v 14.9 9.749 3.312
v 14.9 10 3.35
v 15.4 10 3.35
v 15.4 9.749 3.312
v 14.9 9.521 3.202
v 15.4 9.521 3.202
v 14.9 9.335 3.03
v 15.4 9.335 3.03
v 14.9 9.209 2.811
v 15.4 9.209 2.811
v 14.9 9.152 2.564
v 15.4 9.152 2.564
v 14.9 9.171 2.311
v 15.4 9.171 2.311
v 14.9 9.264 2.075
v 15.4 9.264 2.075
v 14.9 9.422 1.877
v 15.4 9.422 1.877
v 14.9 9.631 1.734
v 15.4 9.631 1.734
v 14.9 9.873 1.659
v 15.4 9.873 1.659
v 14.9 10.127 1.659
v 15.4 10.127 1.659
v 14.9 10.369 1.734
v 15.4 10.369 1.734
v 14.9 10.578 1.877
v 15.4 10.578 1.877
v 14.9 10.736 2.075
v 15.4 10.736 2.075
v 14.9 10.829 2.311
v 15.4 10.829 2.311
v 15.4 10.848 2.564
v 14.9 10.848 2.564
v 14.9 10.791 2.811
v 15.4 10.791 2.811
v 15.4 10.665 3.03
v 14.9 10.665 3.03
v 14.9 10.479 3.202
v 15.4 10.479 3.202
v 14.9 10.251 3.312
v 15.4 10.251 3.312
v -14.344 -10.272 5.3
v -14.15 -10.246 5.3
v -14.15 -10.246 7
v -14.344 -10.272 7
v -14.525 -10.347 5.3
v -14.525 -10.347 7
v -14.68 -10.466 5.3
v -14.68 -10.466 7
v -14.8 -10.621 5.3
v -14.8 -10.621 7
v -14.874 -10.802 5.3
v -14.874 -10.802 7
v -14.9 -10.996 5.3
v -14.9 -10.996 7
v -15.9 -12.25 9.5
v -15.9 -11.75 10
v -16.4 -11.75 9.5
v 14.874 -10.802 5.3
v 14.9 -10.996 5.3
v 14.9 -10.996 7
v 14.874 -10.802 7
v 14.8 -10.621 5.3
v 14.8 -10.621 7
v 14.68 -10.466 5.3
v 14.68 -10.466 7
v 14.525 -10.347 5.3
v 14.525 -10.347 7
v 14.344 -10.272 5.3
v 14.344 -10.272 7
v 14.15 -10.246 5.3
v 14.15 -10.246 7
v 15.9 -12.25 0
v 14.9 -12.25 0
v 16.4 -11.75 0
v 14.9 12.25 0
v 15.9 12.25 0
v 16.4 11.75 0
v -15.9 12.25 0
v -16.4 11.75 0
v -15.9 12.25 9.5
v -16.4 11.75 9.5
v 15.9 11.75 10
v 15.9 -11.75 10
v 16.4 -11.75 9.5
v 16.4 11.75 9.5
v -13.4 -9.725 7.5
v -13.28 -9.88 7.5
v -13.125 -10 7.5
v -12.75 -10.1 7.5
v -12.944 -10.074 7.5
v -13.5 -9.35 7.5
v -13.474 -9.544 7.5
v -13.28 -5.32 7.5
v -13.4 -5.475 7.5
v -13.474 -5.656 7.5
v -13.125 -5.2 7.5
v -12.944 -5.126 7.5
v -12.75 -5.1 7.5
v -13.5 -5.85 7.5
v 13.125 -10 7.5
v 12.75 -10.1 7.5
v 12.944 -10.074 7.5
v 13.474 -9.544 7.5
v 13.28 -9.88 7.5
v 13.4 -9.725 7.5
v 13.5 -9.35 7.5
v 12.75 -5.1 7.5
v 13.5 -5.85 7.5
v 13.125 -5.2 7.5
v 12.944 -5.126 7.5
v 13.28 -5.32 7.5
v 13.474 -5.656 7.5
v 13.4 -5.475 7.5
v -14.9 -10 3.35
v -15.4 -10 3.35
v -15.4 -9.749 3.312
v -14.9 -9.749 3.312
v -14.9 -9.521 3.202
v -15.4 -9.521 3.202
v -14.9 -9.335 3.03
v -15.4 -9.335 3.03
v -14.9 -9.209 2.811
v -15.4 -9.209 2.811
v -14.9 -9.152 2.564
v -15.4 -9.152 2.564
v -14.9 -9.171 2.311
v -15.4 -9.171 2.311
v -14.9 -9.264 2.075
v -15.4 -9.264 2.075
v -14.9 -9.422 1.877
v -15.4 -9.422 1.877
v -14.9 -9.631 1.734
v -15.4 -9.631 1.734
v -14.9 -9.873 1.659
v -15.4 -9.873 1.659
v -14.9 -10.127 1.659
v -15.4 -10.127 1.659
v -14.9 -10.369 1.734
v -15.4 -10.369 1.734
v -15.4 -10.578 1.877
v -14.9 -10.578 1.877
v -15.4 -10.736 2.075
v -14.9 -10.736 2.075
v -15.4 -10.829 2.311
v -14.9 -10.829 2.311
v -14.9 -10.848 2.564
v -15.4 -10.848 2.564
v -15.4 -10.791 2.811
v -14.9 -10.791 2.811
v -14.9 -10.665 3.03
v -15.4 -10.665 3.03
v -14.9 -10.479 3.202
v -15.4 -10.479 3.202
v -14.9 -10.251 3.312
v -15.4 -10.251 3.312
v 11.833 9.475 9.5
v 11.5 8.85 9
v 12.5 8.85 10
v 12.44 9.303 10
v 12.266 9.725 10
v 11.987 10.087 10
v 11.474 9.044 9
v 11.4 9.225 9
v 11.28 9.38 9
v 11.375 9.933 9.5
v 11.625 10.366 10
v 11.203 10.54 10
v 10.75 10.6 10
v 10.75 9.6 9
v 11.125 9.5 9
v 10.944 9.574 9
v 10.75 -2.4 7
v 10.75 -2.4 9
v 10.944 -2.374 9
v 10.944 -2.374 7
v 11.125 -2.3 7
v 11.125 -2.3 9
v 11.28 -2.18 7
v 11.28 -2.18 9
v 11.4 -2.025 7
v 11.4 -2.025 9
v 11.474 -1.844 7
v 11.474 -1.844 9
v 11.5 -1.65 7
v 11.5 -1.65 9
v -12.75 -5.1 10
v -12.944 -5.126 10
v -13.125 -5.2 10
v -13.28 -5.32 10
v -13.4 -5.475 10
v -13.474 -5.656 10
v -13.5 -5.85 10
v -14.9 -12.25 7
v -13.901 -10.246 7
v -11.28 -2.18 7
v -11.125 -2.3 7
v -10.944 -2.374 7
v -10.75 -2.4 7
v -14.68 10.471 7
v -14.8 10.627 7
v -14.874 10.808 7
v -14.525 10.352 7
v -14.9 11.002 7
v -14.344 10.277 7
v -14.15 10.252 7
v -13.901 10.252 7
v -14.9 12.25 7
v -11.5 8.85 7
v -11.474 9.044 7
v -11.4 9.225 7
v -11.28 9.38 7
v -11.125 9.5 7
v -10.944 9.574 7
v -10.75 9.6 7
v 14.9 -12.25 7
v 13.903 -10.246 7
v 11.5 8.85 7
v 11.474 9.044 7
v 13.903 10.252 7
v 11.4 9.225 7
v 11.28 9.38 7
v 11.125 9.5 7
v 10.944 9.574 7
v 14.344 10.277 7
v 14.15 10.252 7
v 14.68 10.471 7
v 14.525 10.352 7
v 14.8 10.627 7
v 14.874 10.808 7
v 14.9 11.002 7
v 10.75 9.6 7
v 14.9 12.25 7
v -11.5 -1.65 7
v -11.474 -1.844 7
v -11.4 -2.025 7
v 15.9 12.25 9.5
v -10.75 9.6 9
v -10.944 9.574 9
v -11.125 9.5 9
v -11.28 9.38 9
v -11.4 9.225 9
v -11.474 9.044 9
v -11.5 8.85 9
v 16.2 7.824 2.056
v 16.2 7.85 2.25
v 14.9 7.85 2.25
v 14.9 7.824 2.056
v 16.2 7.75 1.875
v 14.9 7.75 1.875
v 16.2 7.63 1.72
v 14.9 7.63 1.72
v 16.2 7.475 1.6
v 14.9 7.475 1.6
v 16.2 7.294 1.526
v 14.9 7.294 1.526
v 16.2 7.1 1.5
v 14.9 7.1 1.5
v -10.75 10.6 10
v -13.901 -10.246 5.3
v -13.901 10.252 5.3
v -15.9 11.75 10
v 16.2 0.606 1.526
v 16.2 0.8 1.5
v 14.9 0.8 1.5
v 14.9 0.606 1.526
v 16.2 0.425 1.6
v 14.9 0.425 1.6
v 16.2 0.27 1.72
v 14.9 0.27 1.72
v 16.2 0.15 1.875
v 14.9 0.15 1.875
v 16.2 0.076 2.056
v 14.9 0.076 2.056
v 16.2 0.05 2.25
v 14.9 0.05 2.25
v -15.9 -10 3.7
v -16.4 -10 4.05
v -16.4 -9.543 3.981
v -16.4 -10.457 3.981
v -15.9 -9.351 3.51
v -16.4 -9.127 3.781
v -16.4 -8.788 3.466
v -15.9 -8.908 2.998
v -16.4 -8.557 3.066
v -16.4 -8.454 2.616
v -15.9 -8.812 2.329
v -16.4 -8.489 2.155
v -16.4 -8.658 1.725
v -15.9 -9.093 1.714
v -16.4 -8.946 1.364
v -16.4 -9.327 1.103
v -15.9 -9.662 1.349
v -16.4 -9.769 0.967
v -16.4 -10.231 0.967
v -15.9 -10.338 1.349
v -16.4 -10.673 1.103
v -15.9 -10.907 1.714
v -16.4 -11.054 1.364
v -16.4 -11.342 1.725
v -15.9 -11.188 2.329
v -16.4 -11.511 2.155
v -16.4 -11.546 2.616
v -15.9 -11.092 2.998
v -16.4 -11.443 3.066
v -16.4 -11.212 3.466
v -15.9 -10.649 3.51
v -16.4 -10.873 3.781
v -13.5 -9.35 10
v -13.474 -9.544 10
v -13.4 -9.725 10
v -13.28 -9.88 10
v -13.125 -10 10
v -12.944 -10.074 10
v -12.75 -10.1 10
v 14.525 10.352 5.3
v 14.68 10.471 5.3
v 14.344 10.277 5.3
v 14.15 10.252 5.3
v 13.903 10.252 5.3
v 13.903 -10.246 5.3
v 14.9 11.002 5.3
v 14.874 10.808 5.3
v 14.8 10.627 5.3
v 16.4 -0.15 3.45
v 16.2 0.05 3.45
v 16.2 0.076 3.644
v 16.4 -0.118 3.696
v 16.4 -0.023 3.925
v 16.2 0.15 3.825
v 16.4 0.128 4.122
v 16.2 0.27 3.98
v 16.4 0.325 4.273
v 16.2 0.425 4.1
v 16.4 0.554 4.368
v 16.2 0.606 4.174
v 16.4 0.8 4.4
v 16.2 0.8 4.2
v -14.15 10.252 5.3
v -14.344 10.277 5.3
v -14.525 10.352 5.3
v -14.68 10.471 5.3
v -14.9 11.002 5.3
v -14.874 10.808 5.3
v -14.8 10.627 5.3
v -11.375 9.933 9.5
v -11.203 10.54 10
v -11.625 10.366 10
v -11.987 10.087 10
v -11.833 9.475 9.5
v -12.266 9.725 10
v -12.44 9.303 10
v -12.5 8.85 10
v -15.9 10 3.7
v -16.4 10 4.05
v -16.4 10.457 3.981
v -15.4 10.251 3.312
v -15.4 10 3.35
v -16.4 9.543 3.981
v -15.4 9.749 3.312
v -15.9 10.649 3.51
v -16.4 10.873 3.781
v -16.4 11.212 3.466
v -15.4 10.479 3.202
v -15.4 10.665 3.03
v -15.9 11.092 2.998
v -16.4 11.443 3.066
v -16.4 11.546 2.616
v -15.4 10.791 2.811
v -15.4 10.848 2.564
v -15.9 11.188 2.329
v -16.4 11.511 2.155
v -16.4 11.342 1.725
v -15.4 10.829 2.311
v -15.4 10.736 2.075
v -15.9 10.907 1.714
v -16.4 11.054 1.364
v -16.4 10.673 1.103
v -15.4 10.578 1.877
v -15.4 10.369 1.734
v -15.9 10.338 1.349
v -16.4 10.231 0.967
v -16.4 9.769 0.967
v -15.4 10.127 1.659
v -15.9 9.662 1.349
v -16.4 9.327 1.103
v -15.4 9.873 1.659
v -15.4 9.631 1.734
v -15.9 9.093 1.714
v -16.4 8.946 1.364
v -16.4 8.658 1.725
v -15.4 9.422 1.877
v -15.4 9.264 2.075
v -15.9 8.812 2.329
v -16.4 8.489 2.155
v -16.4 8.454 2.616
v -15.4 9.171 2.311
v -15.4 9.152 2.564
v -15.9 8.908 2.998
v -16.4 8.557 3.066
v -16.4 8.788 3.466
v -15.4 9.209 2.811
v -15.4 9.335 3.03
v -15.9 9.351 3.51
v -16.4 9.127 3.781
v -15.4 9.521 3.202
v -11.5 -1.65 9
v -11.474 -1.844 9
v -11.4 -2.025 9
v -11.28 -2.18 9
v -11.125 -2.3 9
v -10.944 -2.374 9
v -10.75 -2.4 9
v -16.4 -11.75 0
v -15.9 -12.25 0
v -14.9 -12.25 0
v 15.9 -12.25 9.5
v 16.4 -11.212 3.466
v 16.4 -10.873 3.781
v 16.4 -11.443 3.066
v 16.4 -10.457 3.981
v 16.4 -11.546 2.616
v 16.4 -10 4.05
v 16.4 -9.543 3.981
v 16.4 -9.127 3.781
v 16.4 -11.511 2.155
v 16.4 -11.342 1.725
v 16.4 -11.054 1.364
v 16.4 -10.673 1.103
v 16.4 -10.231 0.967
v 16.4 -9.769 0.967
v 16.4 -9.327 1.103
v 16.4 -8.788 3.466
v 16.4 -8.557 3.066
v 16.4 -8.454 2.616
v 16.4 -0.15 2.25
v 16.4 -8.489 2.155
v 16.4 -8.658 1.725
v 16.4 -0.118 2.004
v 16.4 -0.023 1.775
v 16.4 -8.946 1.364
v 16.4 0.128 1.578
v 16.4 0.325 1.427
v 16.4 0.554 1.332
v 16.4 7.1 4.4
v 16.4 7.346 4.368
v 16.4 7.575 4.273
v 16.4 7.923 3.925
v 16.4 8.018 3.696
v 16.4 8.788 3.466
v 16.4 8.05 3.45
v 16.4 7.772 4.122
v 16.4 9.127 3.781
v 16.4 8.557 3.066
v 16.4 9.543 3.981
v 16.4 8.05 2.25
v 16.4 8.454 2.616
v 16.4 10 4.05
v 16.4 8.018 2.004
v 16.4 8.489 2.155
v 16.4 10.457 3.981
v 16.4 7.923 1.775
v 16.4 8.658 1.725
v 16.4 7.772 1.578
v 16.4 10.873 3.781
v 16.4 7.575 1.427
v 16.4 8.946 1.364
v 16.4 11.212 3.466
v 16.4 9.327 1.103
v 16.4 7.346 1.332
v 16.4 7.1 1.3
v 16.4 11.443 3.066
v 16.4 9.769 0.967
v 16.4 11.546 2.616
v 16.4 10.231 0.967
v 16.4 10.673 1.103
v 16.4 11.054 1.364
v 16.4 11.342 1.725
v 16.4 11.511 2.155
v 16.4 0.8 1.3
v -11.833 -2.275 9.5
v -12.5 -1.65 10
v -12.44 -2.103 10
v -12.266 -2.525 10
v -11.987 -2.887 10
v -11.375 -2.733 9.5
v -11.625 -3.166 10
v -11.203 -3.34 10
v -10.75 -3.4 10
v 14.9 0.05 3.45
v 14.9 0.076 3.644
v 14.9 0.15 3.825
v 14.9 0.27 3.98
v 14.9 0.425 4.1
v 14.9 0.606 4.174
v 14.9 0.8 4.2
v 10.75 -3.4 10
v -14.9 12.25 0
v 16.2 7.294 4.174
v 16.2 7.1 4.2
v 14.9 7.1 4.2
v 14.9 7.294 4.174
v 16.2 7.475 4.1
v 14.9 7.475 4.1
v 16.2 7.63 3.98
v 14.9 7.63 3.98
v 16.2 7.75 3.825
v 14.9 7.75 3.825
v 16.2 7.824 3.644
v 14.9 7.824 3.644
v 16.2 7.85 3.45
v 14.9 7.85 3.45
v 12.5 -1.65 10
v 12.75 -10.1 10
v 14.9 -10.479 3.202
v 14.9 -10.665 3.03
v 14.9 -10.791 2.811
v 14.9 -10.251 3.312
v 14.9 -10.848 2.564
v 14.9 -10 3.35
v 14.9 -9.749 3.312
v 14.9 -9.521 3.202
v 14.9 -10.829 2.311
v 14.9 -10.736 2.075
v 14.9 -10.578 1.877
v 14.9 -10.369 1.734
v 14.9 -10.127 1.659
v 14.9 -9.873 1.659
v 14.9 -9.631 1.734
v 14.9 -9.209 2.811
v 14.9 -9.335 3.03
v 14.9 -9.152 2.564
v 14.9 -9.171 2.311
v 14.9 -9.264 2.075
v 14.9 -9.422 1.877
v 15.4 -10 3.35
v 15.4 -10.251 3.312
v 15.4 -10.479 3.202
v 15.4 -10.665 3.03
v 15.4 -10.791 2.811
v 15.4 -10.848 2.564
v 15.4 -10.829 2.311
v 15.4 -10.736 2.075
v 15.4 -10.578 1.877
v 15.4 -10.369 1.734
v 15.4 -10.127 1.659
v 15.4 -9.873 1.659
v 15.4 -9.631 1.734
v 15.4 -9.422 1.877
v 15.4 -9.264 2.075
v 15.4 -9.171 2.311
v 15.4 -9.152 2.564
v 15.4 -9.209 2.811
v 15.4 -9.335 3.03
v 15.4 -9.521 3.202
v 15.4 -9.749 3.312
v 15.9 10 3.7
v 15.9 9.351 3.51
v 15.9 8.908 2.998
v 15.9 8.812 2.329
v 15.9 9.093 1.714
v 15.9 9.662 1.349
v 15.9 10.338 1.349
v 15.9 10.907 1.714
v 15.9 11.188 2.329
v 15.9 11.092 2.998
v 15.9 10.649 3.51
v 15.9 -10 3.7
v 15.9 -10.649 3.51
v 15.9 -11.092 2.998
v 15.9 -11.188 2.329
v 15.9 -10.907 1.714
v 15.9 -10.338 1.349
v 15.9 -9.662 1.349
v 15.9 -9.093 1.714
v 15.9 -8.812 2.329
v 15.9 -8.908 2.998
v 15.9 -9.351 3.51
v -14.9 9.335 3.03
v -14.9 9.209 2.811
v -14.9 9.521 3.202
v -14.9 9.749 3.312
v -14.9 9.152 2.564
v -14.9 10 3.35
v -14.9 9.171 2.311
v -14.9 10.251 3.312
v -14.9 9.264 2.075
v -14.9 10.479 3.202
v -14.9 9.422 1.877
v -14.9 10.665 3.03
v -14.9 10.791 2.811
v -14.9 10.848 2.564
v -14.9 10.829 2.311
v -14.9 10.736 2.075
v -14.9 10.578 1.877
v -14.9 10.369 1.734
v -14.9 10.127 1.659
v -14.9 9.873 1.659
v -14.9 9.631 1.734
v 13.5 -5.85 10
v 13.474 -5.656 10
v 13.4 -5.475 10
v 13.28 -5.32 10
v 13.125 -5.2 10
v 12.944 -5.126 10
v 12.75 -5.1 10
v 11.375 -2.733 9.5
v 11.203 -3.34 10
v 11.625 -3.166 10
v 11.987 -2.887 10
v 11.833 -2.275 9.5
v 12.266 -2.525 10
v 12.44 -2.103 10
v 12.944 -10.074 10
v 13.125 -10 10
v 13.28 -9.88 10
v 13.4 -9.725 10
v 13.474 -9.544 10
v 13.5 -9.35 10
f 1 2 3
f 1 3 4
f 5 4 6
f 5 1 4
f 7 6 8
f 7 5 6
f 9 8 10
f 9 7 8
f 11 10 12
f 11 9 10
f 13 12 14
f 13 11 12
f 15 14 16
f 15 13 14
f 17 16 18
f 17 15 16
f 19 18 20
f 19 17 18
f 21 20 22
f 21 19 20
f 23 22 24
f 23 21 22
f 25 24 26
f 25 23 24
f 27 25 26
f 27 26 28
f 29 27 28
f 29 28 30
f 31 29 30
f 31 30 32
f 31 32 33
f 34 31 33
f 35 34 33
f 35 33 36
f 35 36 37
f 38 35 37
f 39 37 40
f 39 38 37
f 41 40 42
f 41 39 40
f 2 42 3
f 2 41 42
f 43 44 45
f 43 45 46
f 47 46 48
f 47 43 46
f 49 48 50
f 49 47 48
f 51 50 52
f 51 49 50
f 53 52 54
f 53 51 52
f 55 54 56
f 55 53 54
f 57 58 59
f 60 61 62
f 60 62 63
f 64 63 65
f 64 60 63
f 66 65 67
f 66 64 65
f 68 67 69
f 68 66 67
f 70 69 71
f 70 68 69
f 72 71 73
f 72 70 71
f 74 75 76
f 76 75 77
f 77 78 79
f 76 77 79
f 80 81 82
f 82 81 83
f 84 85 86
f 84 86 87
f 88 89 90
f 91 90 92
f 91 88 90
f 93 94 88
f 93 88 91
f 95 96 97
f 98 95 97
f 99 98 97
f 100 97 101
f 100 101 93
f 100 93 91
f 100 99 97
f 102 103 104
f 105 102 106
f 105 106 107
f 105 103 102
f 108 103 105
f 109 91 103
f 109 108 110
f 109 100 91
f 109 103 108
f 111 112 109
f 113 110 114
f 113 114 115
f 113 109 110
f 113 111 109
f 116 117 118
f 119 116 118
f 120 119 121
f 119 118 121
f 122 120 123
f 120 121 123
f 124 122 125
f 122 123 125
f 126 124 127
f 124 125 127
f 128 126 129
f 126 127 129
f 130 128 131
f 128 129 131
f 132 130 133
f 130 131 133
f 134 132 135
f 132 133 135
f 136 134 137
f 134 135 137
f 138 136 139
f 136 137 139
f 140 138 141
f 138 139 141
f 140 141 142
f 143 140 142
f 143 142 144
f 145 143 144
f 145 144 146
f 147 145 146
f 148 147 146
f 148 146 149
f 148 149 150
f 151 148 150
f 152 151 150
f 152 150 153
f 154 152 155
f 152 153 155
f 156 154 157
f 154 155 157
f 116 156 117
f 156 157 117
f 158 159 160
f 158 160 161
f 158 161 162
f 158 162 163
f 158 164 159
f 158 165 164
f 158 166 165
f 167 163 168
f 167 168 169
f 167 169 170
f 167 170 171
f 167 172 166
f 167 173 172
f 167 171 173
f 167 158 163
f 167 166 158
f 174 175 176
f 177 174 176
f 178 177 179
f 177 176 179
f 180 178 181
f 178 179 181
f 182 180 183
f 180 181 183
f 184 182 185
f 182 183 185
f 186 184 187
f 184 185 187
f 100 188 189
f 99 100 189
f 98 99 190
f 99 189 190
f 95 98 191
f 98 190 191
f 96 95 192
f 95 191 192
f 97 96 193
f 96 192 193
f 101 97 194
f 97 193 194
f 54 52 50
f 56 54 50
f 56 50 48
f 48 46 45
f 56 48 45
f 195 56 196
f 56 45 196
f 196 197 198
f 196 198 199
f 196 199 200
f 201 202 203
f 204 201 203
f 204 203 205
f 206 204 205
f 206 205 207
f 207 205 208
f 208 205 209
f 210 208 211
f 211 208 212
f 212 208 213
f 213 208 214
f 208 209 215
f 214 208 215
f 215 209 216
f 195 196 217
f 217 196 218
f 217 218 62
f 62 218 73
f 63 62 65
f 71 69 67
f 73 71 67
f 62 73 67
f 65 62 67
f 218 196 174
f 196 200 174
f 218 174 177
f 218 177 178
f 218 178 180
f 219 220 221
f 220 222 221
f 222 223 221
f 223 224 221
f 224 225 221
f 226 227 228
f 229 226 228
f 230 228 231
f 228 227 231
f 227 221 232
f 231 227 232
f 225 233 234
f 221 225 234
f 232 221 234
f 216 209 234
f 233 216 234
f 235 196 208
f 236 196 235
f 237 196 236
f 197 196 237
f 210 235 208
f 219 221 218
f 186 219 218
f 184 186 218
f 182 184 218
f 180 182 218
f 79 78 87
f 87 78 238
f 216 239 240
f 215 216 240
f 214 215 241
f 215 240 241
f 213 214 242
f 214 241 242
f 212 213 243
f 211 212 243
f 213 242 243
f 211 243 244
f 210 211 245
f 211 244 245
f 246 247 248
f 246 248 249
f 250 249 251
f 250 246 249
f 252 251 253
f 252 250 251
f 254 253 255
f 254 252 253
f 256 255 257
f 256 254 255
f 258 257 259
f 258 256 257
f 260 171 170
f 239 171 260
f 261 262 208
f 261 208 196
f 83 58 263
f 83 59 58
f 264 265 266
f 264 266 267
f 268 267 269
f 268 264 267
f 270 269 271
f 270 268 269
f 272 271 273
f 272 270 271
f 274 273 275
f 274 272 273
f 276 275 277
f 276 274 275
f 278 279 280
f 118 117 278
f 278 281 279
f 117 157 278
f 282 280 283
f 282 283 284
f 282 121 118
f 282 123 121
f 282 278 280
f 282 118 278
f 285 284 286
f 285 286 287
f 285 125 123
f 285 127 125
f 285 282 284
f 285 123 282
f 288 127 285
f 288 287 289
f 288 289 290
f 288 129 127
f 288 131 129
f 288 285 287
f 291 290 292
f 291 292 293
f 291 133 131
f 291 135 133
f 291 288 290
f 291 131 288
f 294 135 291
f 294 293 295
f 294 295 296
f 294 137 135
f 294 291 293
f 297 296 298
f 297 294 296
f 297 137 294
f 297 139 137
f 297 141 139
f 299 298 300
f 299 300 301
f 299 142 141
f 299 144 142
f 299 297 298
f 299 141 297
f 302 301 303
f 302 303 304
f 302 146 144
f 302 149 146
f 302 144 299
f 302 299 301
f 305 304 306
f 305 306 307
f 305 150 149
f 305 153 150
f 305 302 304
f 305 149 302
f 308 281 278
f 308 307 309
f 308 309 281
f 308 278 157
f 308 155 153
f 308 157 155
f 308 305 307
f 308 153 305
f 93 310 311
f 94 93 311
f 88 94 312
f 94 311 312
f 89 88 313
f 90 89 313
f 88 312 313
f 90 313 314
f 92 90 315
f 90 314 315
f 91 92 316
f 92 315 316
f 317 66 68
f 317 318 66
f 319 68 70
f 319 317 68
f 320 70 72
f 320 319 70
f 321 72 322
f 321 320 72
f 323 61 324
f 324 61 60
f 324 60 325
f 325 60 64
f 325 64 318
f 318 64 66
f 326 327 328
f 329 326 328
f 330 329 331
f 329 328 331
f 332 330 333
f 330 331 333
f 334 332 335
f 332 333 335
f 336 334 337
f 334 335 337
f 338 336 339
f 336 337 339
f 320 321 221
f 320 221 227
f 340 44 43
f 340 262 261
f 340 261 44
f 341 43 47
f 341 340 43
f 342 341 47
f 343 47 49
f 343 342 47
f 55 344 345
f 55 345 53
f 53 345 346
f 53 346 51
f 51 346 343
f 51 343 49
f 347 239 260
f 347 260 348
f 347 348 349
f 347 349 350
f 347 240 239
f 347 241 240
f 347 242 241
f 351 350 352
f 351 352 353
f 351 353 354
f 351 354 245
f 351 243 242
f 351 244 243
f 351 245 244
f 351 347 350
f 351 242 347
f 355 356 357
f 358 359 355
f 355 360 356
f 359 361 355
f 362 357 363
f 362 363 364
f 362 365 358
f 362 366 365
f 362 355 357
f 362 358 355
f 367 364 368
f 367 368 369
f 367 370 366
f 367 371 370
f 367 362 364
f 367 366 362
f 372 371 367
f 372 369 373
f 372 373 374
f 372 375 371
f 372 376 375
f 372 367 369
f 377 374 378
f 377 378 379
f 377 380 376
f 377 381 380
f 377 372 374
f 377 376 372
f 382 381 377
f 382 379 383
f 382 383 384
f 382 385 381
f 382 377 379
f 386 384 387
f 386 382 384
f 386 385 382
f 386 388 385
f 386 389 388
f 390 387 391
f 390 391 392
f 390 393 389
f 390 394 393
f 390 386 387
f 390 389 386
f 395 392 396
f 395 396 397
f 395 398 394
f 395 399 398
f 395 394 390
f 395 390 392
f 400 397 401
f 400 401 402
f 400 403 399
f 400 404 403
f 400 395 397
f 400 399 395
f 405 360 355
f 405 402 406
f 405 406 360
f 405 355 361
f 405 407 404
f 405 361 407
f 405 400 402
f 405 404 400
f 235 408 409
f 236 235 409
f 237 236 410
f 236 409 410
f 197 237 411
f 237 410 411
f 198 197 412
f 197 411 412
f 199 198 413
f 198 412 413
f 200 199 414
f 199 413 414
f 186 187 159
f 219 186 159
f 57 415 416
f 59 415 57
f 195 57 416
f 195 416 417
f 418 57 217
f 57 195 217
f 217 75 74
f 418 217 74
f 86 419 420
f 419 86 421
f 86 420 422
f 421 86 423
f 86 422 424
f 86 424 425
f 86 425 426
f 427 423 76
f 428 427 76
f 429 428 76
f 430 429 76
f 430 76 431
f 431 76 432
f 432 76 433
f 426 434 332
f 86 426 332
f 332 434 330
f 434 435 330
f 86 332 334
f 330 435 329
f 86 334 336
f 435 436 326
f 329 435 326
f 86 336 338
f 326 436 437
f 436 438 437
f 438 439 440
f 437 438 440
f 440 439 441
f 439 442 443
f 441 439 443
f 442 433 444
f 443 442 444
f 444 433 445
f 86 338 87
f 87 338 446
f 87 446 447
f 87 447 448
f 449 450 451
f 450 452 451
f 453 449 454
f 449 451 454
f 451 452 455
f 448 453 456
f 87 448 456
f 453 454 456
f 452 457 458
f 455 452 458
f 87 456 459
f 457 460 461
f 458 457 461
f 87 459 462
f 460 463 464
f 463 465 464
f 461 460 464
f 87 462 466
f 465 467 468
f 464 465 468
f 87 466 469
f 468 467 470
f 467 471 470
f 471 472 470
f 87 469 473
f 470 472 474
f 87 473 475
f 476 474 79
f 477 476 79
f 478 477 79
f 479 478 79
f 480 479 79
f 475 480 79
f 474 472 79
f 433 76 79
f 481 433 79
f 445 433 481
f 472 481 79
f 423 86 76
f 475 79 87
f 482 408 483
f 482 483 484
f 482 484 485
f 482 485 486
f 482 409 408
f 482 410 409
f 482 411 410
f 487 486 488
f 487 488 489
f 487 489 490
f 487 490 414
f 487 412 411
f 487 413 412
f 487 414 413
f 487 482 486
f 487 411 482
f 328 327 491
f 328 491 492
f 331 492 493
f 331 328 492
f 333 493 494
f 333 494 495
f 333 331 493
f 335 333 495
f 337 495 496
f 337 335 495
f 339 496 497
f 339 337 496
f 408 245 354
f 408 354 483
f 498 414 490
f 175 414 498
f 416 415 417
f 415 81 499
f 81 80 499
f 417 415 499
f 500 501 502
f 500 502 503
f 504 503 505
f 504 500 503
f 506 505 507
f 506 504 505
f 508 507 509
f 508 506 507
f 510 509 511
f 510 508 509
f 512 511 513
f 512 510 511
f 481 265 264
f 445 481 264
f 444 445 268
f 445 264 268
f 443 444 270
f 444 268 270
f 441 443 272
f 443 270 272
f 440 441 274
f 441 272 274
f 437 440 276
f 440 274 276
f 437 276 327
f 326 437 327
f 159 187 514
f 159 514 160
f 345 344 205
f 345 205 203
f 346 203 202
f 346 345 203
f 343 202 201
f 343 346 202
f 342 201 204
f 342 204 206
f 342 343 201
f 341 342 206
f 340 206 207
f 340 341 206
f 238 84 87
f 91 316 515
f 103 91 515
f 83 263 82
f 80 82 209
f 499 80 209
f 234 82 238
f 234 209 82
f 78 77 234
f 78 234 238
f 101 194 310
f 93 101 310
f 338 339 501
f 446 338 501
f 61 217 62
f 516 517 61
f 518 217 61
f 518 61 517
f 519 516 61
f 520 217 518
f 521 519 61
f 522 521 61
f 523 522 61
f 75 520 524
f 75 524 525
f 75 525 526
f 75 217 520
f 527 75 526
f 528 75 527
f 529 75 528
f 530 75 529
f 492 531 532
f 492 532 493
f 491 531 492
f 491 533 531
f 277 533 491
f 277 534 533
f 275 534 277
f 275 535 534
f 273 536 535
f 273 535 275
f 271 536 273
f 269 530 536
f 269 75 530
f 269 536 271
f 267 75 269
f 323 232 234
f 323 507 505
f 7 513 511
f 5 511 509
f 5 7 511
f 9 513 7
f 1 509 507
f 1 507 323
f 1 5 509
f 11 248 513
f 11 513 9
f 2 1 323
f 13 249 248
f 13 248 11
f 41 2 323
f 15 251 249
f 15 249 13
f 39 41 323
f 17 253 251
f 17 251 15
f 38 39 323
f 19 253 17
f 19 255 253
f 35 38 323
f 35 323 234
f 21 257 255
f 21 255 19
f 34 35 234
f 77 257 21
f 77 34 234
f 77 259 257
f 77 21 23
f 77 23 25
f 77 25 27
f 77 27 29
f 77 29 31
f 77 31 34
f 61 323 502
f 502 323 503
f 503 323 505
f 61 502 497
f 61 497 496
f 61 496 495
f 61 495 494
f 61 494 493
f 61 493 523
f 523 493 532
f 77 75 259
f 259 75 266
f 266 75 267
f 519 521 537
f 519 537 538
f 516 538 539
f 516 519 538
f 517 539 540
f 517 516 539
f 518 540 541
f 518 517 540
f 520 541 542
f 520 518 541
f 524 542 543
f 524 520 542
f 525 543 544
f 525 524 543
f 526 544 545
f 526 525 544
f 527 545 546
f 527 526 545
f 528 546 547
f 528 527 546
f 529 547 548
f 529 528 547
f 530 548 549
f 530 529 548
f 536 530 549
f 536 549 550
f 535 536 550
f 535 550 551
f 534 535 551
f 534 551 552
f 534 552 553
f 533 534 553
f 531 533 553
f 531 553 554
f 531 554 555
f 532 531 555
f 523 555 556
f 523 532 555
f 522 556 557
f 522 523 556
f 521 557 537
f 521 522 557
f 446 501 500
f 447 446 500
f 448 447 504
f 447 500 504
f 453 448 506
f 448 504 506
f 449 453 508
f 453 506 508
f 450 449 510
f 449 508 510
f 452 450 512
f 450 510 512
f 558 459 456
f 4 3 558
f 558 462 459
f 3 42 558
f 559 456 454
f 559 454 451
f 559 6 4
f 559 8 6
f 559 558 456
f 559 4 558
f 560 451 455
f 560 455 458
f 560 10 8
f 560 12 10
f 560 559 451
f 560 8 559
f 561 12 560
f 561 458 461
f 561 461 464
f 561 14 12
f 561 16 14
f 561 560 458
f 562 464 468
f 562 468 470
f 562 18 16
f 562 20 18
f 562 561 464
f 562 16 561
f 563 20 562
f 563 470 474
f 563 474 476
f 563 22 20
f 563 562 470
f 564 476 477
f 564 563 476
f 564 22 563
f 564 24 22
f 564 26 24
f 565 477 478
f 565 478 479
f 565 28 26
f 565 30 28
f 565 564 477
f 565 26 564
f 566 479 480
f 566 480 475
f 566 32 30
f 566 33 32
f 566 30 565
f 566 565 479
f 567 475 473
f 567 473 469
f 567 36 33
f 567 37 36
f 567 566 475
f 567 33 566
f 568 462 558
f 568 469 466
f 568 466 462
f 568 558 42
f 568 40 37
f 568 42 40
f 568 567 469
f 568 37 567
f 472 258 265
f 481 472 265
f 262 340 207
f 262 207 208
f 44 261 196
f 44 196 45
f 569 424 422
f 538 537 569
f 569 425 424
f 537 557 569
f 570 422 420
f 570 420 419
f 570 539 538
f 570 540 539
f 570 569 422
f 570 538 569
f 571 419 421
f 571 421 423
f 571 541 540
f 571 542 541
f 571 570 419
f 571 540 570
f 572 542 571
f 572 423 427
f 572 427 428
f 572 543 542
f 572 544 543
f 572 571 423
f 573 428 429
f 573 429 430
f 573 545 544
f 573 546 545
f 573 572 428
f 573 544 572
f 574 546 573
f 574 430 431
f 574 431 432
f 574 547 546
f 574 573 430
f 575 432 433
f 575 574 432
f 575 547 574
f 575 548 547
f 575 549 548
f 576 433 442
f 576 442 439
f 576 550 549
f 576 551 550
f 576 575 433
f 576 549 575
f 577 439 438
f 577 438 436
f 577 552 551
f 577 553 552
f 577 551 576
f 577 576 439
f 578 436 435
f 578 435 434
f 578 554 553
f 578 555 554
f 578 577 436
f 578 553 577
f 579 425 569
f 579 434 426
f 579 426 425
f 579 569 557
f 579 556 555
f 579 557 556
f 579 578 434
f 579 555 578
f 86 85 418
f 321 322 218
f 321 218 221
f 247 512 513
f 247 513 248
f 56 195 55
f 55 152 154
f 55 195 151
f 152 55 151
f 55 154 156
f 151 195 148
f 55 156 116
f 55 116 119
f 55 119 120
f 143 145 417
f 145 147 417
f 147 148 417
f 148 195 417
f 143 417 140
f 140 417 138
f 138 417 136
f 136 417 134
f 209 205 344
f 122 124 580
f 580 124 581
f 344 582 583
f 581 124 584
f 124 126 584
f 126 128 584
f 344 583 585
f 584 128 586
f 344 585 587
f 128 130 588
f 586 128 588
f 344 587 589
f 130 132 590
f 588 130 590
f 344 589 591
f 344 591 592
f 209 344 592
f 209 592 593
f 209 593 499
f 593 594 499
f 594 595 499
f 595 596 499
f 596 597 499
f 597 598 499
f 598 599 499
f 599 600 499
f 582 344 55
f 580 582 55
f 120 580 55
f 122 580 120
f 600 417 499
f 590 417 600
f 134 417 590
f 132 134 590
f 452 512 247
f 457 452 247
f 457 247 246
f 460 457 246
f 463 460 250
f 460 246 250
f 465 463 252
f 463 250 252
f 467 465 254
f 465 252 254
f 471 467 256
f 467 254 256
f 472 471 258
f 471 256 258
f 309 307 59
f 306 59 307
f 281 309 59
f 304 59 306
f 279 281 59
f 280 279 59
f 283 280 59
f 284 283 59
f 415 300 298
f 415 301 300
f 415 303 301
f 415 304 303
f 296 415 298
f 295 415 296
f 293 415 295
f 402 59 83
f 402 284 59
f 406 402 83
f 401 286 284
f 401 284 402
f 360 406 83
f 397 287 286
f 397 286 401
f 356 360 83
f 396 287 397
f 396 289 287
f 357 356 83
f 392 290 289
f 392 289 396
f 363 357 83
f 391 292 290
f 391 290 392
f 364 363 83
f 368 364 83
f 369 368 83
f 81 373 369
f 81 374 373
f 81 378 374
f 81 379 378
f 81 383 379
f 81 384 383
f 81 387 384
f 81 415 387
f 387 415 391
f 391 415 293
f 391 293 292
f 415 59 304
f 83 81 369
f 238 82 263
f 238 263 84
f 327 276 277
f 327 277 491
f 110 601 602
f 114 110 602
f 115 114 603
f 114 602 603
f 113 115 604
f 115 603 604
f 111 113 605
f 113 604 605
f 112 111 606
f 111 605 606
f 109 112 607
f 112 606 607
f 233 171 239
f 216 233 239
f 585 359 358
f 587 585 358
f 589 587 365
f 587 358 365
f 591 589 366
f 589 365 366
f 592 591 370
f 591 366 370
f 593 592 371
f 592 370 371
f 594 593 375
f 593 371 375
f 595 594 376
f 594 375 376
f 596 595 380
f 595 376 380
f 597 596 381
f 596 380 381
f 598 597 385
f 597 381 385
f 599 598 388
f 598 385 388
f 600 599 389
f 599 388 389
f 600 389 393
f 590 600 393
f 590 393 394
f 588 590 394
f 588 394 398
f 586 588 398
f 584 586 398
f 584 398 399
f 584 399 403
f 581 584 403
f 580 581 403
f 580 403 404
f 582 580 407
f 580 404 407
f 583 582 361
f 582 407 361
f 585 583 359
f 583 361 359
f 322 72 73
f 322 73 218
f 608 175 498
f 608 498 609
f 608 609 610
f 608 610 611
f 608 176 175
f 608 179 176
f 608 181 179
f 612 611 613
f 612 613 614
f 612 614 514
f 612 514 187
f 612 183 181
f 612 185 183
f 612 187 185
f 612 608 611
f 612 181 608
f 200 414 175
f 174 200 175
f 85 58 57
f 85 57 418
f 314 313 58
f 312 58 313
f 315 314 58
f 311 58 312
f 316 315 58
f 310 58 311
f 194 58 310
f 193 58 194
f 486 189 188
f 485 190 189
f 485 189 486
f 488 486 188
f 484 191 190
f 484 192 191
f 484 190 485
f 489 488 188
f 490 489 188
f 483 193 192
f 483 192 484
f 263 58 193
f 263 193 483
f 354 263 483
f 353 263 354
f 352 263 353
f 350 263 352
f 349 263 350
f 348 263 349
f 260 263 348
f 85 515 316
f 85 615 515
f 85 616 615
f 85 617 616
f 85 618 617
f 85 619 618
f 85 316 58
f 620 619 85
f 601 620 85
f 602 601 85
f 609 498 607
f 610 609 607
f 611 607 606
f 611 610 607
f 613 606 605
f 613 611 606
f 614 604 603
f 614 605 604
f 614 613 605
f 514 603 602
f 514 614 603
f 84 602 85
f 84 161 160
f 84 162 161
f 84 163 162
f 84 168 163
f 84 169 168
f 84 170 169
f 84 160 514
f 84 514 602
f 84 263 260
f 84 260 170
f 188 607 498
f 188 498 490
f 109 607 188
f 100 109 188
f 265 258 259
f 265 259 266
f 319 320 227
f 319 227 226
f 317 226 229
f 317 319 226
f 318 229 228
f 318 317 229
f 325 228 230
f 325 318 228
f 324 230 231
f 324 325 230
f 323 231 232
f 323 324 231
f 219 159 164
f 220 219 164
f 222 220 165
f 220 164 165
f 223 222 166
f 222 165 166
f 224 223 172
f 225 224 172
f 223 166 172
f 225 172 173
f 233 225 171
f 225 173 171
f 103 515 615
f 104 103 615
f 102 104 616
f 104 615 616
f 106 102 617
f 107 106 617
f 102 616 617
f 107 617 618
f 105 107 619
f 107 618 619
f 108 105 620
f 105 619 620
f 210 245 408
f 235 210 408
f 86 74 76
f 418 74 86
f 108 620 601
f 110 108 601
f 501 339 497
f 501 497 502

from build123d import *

# Parameters (mm, degrees)
SKETCH1_W           = 32.8
SKETCH1_H           = 24.5
BOSS_EXTRUDE1_DEPTH = 10
SKETCH3_W           = 29.8
SKETCH3_H           = 24.5
CUT_EXTRUDE2_DEPTH  = 5.3
CUT_EXTRUDE3_DEPTH  = 23.782065315
CUT_EXTRUDE4_DEPTH  = 1.5
CHAMFER1_SIZE       = 1
CHAMFER2_SIZE       = 0.2
CHAMFER3_SIZE       = 0.5
CUT_EXTRUDE6_DEPTH  = 2.5
SKETCH10_R          = 0.85
CUT_EXTRUDE7_DEPTH  = 1.5
CUT_EXTRUDE8_START  = -1.5
SKETCH9_R           = 0.85
CUT_EXTRUDE8_DEPTH  = 1.5
CHAMFER7_SIZE       = 0.7
CHAMFER7_SIZE2      = 0.999703605
CHAMFER8_SIZE       = 0.7
CHAMFER8_SIZE2      = 0.999703605
CUT_EXTRUDE11_DEPTH = 1.7


with BuildPart() as part:
    # Sketch1 → Boss-Extrude1 (new body)
    with BuildSketch(Plane.XY):
        Rectangle(SKETCH1_W, SKETCH1_H)
    extrude(amount=BOSS_EXTRUDE1_DEPTH)

    # Sketch3 → Cut-Extrude2 (cut)
    with BuildSketch(Plane(origin=(0, 0, 0), x_dir=(-1, 0, 0), z_dir=(0, 0, -1))):
        Rectangle(SKETCH3_W, SKETCH3_H)
    extrude(amount=-CUT_EXTRUDE2_DEPTH, mode=Mode.SUBTRACT)

    # Sketch4 → Cut-Extrude3 (cut, through all)
    with BuildSketch(Plane.XY.offset(10)):
        with BuildLine():
            Line((-10.75, -2.4), (10.75, -2.4))
            ThreePointArc((10.75, -2.4), (11.280330086, -2.180330086), (11.5, -1.65))
            Line((11.5, -1.65), (11.5, 8.85))
            ThreePointArc((11.5, 8.85), (11.280330086, 9.380330086), (10.75, 9.6))
            Line((10.75, 9.6), (-10.75, 9.6))
            ThreePointArc((-10.75, 9.6), (-11.280330086, 9.380330086), (-11.5, 8.85))
            Line((-11.5, 8.85), (-11.5, -1.65))
            ThreePointArc((-11.5, -1.65), (-11.280330086, -2.180330086), (-10.75, -2.4))
        make_face()
    extrude(amount=-CUT_EXTRUDE3_DEPTH, mode=Mode.SUBTRACT)

    # Sketch5 → Cut-Extrude4 (cut)
    with BuildSketch(Plane(origin=(16.4, 0, 0), x_dir=(0, 0, -1), z_dir=(1, 0, 0))):
        with BuildLine():
            Line((-3.45, 7.85), (-2.25, 7.85))
            ThreePointArc((-2.25, 7.85), (-1.719669914, 7.630330086), (-1.5, 7.1))
            Line((-1.5, 7.1), (-1.5, 0.8))
            ThreePointArc((-1.5, 0.8), (-1.719669914, 0.269669914), (-2.25, 0.05))
            Line((-2.25, 0.05), (-3.45, 0.05))
            ThreePointArc((-3.45, 0.05), (-3.980330086, 0.269669914), (-4.2, 0.8))
            Line((-4.2, 0.8), (-4.2, 7.1))
            ThreePointArc((-4.2, 7.1), (-3.980330086, 7.630330086), (-3.45, 7.85))
        make_face()
    extrude(amount=-CUT_EXTRUDE4_DEPTH, mode=Mode.SUBTRACT)

    # Chamfer1
    chamfer1_edges = [part.edges().sort_by_distance(p)[0] for p in [
        (-11.280330086, -2.180330086, 10),
        (0, -2.4, 10),
        (11.280330086, -2.180330086, 10),
        (11.5, 3.6, 10),
        (11.280330086, 9.380330086, 10),
        (0, 9.6, 10),
        (-11.280330086, 9.380330086, 10),
        (-11.5, 3.6, 10),
    ]]
    chamfer(chamfer1_edges, length=CHAMFER1_SIZE)

    # Chamfer2
    chamfer2_edges = [part.edges().sort_by_distance(p)[0] for p in [
        (16.4, 7.85, 2.85),
        (16.4, 3.95, 1.5),
        (16.4, 7.630330086, 3.980330086),
        (16.4, 3.95, 4.2),
        (16.4, 0.269669914, 3.980330086),
        (16.4, 0.05, 2.85),
        (16.4, 0.269669914, 1.719669914),
        (16.4, 7.630330086, 1.719669914),
    ]]
    chamfer(chamfer2_edges, length=CHAMFER2_SIZE)

    # Chamfer3
    chamfer3_edges = [part.edges().sort_by_distance(p)[0] for p in [
        (-16.4, 0, 10),
        (0, -12.25, 10),
        (16.4, 0, 10),
        (0, 12.25, 10),
        (16.4, -12.25, 5),
        (-16.4, -12.25, 5),
        (-16.4, 12.25, 5),
        (16.4, 12.25, 5),
    ]]
    chamfer(chamfer3_edges, length=CHAMFER3_SIZE)

    # Sketch8 → Cut-Extrude6 (cut)
    with BuildSketch(Plane.XY.offset(10)):
        with BuildLine():
            Line((-12.75, -10.1), (12.75, -10.1))
            ThreePointArc((12.75, -10.1), (13.280330086, -9.880330086), (13.5, -9.35))
            Line((13.5, -9.35), (13.5, -5.85))
            ThreePointArc((13.5, -5.85), (13.280330086, -5.319669914), (12.75, -5.1))
            Line((12.75, -5.1), (-12.75, -5.1))
            ThreePointArc((-12.75, -5.1), (-13.280330086, -5.319669914), (-13.5, -5.85))
            Line((-13.5, -5.85), (-13.5, -9.35))
            ThreePointArc((-13.5, -9.35), (-13.280330086, -9.880330086), (-12.75, -10.1))
        make_face()
    extrude(amount=-CUT_EXTRUDE6_DEPTH, mode=Mode.SUBTRACT)

    # Sketch10 → Cut-Extrude7 (cut)
    with BuildSketch(Plane.ZY.offset(16.4)):
        with Locations((2.5, 10)):
            Circle(SKETCH10_R)
        with Locations((2.5, -10)):
            Circle(SKETCH10_R)
    extrude(amount=-CUT_EXTRUDE7_DEPTH, mode=Mode.SUBTRACT)

    # Sketch9 → Cut-Extrude8 (cut)
    with BuildSketch(Plane(origin=(16.4, 0, 0), x_dir=(0, 0, -1), z_dir=(1, 0, 0)).offset(CUT_EXTRUDE8_START)):
        with Locations(Location((-2.5, -10, 0), (0, 0, 180))):
            Circle(SKETCH9_R)
        with Locations(Location((-2.5, 10, 0), (0, 0, 180))):
            Circle(SKETCH9_R)
    extrude(amount=CUT_EXTRUDE8_DEPTH, mode=Mode.SUBTRACT)

    # Chamfer7
    chamfer7_edges = [part.edges().sort_by_distance(p)[0] for p in [
        (-16.4, 10, 1.65),
        (-16.4, -10, 1.65),
    ]]
    chamfer7_side = [part.faces().sort_by_distance(p)[0] for p in [
        (-16.4, 0, 4.796701497),
    ]]
    chamfer(chamfer7_edges, length=CHAMFER7_SIZE, length2=CHAMFER7_SIZE2, reference=chamfer7_side[0])

    # Chamfer8
    chamfer8_edges = [part.edges().sort_by_distance(p)[0] for p in [
        (16.4, -10, 1.65),
        (16.4, 10, 1.65),
    ]]
    chamfer8_side = [part.faces().sort_by_distance(p)[0] for p in [
        (16.4, -0.501630017, 5.043922739),
    ]]
    chamfer(chamfer8_edges, length=CHAMFER8_SIZE, length2=CHAMFER8_SIZE2, reference=chamfer8_side[0])

    # Sketch15 → Cut-Extrude11 (cut)
    with BuildSketch(Plane(origin=(0, 0, 5.3), x_dir=(-1, 0, 0), z_dir=(0, 0, -1))):
        with BuildLine():
            Line((-14.9, 12.25), (14.9, 12.25))
            Line((14.9, 12.25), (14.9, 11.001705033))
            ThreePointArc((14.9, 11.001705033), (14.680330086, 10.471374947), (14.15, 10.251705033))
            Line((14.15, 10.251705033), (13.900532635, 10.251705033))
            Line((13.900532635, 10.251705033), (13.900532635, -10.246251607))
            Line((13.900532635, -10.246251607), (14.15, -10.246251607))
            ThreePointArc((14.15, -10.246251607), (14.680330086, -10.465921521), (14.9, -10.996251607))
            Line((14.9, -10.996251607), (14.9, -12.25))
            Line((14.9, -12.25), (-14.9, -12.25))
            Line((-14.9, -12.25), (-14.9, -10.996251607))
            ThreePointArc((-14.9, -10.996251607), (-14.680330086, -10.465921521), (-14.15, -10.246251607))
            Line((-14.15, -10.246251607), (-13.902617277, -10.246251607))
            Line((-13.902617277, -10.246251607), (-13.902617277, 10.251705033))
            Line((-13.902617277, 10.251705033), (-14.15, 10.251705033))
            ThreePointArc((-14.15, 10.251705033), (-14.680330086, 10.471374947), (-14.9, 11.001705033))
            Line((-14.9, 11.001705033), (-14.9, 12.25))
        make_face()
    extrude(amount=-CUT_EXTRUDE11_DEPTH, mode=Mode.SUBTRACT)


solid = part.part
